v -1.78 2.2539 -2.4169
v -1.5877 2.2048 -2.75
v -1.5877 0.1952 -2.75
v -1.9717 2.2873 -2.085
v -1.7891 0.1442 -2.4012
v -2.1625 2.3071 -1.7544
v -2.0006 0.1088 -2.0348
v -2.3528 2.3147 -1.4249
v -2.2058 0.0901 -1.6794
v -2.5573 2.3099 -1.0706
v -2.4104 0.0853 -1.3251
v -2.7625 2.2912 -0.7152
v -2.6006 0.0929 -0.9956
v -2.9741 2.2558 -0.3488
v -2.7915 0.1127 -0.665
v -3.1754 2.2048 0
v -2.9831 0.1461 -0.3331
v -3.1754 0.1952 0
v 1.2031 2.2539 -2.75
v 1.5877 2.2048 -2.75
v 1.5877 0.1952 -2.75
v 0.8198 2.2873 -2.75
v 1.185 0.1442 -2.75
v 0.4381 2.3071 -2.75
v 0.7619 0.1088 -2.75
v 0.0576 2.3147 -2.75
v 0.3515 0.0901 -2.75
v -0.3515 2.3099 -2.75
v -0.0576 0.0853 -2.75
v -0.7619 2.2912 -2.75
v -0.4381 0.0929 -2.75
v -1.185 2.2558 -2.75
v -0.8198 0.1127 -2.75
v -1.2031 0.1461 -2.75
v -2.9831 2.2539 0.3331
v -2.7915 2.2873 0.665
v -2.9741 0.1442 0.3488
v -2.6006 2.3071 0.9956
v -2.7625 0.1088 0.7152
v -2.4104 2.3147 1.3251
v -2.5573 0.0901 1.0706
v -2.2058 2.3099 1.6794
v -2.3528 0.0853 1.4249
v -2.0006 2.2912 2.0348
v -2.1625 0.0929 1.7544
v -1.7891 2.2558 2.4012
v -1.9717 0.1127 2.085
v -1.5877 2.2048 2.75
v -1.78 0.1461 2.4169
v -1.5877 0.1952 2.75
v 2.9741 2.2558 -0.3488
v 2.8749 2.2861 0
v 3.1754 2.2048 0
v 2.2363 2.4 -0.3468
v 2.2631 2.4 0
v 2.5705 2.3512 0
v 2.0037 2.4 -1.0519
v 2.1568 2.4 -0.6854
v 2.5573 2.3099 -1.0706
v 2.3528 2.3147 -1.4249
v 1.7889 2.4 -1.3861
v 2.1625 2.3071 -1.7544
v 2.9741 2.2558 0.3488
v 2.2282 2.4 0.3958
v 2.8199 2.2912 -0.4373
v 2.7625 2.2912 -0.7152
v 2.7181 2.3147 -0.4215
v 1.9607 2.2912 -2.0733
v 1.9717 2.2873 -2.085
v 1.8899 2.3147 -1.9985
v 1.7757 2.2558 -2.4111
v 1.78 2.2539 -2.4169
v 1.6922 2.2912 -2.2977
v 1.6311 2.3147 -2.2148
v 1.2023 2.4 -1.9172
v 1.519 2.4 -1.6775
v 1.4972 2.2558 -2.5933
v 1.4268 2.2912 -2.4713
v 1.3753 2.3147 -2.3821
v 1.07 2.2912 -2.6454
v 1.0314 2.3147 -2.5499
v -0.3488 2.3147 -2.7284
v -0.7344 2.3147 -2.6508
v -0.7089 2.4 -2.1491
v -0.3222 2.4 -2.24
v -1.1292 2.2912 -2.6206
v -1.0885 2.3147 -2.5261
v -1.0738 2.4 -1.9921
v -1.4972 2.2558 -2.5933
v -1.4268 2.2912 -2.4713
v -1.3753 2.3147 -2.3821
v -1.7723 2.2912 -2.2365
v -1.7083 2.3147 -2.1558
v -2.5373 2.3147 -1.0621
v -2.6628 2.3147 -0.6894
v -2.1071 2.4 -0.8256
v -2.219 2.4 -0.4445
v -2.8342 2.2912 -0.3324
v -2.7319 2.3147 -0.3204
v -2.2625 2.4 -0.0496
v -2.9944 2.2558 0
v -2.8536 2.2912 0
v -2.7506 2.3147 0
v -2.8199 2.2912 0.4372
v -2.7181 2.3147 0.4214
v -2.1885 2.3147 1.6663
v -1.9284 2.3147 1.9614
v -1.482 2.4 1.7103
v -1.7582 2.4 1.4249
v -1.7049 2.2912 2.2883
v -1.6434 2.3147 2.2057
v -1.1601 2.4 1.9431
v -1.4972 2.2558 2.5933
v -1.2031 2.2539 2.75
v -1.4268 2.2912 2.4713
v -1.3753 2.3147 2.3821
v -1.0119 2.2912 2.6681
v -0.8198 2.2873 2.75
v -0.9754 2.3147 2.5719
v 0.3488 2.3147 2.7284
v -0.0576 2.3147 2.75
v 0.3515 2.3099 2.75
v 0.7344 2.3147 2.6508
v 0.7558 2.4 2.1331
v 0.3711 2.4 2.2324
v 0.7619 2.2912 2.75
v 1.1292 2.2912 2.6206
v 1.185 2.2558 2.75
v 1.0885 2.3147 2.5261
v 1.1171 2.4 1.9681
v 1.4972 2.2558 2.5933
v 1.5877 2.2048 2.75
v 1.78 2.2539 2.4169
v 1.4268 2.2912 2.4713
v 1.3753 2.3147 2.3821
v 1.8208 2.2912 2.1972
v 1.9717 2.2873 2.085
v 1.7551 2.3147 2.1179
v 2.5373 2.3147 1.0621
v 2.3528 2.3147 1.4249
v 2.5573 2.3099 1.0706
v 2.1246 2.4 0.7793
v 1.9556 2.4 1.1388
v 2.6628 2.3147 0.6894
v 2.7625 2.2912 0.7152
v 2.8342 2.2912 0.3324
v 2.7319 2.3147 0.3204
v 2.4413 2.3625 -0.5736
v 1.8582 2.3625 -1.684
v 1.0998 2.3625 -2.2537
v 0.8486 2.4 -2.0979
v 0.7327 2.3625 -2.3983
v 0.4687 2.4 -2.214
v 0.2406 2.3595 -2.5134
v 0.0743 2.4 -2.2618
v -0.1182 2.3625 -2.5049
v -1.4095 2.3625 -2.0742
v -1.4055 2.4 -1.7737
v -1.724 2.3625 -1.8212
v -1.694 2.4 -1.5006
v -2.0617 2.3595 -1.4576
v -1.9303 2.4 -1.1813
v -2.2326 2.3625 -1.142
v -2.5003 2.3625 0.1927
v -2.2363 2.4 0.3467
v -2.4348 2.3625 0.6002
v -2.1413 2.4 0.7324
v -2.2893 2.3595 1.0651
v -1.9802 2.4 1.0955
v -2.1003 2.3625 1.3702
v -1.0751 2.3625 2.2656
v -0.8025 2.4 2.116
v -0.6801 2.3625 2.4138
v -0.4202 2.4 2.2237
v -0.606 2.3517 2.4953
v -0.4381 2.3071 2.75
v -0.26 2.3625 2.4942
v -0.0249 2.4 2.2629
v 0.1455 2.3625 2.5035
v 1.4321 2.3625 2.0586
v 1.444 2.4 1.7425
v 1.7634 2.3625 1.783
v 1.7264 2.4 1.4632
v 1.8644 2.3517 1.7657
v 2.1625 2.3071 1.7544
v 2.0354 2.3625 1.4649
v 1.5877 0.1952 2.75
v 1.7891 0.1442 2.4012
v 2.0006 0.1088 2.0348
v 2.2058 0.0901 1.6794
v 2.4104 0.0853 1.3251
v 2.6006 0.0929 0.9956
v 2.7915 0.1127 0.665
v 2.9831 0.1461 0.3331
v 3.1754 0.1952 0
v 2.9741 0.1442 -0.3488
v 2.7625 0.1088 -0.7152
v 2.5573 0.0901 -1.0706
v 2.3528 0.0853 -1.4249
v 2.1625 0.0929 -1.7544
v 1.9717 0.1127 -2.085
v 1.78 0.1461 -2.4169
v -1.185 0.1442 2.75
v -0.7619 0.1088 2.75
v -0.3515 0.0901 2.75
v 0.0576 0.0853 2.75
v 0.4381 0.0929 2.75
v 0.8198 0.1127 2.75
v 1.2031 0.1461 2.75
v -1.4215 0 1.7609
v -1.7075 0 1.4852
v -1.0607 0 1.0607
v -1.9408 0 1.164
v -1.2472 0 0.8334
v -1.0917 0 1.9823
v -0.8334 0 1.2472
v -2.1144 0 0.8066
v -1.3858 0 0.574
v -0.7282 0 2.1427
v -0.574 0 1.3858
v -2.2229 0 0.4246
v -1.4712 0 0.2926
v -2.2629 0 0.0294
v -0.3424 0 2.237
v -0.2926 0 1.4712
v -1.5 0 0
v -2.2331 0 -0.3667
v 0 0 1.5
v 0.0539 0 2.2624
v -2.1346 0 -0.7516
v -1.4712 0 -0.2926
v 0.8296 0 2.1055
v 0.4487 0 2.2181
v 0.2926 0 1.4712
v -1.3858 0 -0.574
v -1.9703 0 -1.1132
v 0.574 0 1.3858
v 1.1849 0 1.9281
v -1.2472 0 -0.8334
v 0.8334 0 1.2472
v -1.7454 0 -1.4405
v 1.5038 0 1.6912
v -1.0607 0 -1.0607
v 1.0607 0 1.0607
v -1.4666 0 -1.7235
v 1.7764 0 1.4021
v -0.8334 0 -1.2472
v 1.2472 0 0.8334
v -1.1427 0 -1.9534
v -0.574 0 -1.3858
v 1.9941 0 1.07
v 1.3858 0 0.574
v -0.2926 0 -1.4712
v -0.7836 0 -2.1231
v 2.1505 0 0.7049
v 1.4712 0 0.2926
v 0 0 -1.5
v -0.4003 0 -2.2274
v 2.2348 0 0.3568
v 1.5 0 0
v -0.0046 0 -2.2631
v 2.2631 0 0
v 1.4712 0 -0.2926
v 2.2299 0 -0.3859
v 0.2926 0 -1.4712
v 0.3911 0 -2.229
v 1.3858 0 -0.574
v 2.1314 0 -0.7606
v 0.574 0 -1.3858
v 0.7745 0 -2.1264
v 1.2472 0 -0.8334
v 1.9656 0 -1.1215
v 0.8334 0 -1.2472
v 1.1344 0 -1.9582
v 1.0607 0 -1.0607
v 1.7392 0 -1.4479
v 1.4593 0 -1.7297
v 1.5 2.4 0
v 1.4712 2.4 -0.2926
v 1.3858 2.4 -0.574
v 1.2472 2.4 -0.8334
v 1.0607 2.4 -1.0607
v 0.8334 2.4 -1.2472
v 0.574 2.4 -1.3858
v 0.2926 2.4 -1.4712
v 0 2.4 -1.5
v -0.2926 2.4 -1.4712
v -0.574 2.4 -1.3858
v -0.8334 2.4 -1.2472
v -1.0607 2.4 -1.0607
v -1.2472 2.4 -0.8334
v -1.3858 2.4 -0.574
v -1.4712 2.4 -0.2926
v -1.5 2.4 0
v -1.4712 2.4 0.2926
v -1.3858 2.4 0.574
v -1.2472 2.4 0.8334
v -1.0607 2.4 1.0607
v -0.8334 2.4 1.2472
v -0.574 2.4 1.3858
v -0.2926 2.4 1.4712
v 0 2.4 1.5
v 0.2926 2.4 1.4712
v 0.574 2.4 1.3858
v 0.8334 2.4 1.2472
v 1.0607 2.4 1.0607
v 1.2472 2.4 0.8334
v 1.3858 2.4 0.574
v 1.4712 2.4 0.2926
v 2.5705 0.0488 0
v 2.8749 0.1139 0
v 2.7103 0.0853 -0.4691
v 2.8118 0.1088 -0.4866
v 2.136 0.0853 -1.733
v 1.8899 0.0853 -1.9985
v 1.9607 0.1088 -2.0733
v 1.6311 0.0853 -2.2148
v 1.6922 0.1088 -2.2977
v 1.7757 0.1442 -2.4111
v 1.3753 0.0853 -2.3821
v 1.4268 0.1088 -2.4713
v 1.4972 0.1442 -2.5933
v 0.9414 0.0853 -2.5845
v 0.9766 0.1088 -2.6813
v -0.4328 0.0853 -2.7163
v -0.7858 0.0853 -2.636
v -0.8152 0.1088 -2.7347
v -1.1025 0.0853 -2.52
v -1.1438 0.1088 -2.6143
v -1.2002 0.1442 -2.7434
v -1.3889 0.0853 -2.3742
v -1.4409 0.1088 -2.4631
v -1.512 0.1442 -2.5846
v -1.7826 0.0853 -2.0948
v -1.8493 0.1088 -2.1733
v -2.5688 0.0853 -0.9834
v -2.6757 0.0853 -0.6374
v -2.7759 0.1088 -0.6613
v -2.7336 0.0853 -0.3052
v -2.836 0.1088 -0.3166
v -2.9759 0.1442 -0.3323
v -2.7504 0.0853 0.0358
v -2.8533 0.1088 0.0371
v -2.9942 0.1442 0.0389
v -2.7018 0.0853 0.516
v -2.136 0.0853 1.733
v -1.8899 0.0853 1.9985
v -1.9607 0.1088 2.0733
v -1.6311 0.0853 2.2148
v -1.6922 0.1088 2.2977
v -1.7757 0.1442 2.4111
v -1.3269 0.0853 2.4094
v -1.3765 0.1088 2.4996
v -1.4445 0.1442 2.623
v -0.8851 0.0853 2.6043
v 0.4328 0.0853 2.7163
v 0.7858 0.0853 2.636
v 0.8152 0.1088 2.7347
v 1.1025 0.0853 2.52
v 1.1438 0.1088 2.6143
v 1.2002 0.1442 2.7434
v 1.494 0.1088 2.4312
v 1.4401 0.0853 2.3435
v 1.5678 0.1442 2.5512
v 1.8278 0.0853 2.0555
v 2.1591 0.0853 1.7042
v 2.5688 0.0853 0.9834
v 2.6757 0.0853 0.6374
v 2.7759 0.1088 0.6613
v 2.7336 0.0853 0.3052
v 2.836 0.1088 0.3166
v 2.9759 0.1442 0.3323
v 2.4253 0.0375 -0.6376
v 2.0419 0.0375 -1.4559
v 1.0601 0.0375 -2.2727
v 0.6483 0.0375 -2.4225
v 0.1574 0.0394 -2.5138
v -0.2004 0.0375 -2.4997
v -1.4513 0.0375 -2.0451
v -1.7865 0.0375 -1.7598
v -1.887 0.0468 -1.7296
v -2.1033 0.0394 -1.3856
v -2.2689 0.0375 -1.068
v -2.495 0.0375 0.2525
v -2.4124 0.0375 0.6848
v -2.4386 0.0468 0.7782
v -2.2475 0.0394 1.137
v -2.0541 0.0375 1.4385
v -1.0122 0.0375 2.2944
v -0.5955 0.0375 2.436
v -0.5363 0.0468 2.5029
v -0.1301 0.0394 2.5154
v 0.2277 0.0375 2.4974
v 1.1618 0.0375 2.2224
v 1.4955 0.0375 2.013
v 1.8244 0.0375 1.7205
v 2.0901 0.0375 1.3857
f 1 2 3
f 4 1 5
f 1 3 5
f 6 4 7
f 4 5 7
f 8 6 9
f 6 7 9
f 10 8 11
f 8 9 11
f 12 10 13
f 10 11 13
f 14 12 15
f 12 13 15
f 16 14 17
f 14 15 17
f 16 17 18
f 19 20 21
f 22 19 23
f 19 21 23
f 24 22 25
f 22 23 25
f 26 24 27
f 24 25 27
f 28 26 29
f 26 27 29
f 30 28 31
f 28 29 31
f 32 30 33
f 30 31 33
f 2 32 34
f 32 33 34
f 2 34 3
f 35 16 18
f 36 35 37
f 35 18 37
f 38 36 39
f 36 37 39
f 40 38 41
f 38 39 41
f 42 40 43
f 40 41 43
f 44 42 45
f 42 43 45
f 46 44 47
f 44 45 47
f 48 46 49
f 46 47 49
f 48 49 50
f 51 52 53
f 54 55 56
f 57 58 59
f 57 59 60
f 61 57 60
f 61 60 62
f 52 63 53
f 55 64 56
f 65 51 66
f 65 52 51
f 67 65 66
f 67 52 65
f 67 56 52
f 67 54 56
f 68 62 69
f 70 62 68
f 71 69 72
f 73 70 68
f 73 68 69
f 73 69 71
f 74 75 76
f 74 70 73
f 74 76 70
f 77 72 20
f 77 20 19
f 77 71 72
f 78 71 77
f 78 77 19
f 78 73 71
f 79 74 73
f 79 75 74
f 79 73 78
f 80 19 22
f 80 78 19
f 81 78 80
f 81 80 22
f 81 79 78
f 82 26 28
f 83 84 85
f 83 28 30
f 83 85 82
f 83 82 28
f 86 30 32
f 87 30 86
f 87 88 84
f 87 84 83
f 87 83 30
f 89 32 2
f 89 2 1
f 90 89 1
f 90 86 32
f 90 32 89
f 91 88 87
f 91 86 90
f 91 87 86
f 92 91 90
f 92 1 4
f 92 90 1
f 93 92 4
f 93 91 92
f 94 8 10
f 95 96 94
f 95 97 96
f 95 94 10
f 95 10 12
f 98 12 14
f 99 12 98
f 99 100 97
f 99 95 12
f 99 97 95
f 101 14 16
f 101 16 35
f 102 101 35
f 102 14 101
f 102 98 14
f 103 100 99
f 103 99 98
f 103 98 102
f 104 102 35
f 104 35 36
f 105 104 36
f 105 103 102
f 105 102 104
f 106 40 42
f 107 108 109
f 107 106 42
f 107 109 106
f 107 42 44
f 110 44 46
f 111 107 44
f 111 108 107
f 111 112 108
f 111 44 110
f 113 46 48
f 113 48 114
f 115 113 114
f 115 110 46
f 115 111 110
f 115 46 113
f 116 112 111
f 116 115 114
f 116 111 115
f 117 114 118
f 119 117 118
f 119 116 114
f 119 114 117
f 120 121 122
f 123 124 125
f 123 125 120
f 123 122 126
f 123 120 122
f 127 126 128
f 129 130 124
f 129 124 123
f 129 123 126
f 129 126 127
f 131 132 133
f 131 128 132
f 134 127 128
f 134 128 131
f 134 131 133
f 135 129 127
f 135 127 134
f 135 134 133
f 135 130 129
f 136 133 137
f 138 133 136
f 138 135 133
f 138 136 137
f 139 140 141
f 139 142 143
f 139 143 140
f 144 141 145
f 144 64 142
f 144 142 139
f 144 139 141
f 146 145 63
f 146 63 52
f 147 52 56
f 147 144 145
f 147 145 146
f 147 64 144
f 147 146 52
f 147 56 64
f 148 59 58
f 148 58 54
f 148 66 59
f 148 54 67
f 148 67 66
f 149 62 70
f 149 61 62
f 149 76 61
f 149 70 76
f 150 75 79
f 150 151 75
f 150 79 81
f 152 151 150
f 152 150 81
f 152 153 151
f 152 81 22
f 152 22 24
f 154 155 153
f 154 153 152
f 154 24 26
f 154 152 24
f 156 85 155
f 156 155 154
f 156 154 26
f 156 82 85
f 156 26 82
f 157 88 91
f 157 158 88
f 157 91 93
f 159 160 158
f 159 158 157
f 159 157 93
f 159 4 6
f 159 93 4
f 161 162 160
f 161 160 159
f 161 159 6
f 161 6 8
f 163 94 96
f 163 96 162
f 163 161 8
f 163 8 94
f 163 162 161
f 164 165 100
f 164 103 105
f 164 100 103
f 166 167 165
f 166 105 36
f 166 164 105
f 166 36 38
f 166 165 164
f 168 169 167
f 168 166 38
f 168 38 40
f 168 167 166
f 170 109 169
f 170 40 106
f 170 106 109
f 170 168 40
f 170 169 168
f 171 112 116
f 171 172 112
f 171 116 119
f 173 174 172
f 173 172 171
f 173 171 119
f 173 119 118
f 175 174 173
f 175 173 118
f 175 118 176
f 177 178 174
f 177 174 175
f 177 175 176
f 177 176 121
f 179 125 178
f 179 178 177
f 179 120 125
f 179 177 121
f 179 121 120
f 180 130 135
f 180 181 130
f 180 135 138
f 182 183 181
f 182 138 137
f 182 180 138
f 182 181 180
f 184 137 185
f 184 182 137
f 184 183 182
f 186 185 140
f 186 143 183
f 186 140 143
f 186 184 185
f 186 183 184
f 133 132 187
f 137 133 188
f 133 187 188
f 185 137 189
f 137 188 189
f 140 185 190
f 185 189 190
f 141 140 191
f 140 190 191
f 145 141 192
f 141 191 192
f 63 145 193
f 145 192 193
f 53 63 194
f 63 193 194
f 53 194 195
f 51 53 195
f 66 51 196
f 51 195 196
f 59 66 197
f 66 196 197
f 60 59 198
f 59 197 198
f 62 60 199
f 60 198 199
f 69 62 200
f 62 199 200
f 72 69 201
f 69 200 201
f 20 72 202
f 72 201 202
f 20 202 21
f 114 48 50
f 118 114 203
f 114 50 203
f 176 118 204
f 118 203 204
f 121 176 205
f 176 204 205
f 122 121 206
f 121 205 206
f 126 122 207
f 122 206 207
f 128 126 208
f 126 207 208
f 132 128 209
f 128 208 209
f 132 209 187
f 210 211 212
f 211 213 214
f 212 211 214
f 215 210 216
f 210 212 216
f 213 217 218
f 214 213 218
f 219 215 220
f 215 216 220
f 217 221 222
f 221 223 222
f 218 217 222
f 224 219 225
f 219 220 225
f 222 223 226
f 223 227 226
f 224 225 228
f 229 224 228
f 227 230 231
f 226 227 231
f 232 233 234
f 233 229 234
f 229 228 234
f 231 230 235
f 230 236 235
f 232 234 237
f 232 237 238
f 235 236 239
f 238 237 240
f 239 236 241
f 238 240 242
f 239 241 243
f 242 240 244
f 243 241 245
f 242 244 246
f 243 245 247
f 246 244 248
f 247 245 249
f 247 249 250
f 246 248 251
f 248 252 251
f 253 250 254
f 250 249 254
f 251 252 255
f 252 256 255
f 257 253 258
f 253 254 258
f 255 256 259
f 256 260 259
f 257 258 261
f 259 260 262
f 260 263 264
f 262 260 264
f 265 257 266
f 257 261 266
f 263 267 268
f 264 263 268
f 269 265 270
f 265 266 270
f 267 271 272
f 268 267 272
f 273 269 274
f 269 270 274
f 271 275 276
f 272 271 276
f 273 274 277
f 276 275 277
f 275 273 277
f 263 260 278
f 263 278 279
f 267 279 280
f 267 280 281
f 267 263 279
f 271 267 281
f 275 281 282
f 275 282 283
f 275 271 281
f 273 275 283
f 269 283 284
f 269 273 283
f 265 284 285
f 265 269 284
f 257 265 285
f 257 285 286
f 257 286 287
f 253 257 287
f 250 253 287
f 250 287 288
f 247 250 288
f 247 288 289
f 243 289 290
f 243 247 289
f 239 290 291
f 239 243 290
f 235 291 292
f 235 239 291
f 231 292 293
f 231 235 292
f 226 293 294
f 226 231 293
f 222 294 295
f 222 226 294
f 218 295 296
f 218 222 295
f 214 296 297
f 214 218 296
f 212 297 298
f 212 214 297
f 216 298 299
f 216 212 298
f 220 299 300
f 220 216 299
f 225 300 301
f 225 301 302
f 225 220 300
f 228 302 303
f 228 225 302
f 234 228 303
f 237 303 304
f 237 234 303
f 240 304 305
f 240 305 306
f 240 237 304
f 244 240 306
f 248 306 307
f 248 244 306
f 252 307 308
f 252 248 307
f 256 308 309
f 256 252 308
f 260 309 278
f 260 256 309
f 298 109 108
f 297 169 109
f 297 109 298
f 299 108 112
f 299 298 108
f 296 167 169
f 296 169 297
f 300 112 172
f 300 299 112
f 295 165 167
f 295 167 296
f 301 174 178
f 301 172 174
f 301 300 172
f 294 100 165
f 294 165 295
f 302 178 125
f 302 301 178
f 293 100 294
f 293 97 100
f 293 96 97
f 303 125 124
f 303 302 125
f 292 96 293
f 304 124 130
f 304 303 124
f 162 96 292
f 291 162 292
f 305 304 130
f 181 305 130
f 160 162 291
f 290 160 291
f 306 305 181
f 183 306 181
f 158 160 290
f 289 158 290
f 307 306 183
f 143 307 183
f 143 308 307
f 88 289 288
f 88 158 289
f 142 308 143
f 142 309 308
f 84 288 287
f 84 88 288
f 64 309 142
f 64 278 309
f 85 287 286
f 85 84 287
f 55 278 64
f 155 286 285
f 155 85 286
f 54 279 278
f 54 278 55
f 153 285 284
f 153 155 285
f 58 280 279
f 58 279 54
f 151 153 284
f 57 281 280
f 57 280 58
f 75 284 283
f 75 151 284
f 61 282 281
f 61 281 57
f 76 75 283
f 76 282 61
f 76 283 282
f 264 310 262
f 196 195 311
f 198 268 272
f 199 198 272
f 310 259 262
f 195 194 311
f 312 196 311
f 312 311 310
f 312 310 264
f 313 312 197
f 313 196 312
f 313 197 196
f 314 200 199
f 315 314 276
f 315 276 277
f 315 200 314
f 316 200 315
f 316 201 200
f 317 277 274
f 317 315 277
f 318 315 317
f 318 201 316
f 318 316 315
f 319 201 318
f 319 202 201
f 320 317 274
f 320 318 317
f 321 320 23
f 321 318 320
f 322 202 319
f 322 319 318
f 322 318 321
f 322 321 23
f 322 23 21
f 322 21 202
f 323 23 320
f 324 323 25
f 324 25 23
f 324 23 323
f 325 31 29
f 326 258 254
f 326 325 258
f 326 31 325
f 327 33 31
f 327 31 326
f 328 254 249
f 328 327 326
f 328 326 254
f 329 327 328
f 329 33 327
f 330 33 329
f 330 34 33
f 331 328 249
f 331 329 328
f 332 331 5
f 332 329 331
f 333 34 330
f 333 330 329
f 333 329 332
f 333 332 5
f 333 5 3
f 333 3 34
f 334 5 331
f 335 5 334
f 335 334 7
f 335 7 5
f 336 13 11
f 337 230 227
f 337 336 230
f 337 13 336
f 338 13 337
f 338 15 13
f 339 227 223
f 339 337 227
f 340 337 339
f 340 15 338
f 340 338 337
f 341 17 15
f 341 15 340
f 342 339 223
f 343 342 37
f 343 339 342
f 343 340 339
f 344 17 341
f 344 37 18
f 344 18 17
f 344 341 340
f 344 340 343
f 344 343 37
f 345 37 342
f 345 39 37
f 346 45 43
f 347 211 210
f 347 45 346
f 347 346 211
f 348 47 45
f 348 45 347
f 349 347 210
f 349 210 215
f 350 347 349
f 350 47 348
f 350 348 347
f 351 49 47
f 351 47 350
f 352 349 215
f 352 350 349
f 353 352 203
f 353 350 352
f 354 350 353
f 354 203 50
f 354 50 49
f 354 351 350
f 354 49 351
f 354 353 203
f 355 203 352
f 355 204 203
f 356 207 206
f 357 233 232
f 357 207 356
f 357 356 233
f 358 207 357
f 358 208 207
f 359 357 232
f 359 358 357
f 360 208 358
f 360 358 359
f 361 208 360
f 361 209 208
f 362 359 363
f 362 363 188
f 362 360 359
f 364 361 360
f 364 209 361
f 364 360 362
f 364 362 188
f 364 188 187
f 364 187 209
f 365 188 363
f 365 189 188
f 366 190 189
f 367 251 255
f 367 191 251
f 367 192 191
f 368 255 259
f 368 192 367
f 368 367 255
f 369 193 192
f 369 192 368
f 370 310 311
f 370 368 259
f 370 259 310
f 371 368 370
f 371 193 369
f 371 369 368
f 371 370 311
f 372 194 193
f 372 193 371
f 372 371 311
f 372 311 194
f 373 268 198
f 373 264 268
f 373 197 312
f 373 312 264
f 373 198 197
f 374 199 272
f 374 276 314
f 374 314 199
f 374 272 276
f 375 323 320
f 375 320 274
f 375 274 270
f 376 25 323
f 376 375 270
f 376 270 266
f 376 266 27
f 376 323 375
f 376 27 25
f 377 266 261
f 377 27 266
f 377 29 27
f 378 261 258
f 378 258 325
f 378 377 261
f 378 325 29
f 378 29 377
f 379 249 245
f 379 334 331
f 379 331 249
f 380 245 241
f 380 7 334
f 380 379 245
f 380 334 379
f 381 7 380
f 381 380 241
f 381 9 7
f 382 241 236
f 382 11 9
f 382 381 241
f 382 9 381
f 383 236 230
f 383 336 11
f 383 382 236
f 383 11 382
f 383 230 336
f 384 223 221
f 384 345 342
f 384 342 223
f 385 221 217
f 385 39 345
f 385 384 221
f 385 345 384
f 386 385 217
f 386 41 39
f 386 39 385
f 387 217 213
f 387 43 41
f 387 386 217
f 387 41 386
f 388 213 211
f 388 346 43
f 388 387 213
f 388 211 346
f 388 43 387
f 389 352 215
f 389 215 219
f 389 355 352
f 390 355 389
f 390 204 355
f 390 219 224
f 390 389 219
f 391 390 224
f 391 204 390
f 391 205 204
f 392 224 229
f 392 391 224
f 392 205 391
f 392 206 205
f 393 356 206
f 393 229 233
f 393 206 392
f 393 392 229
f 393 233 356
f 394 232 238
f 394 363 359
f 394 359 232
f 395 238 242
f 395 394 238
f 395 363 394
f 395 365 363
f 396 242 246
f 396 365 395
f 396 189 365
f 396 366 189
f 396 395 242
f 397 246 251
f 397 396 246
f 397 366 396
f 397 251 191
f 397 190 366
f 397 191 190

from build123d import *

# Parameters (mm, degrees)
ESBO_O1_R                = 1.5
RESSALTO_EXTRUS_O1_DEPTH = 2.4


with BuildPart() as part:
    # Esboço1 → Ressalto-extrusão1 (new body)
    with BuildSketch(Plane(origin=(0, 0, 0), x_dir=(1, 0, 0), z_dir=(0, 1, 0))):
        Polygon((3.175426481, 0), (1.58771324, 2.75), (-1.58771324, 2.75), (-3.175426481, 0), (-1.58771324, -2.75), (1.58771324, -2.75), align=None)
        Circle(ESBO_O1_R, mode=Mode.SUBTRACT)
    extrude(amount=RESSALTO_EXTRUS_O1_DEPTH)

    # Esboço3 → Corte-Revolução1 (revolve, cut)
    with BuildSketch(Plane.XY):
        with BuildLine():
            Line((1.5, 2.45), (1.5, 3.039454742))
            Line((1.5, 3.039454742), (3.5, 3.039454742))
            Line((3.5, 3.039454742), (3.5, 2.097346039))
            ThreePointArc((3.5, 2.097346039), (2.515426612, 2.361161683), (1.5, 2.45))
        make_face()
        with BuildLine():
            ThreePointArc((1.5, -0.05), (2.515426612, 0.038838317), (3.5, 0.302653961))
            Line((3.5, 0.302653961), (3.5, -0.837086604))
            Line((3.5, -0.837086604), (1.5, -0.837086604))
            Line((1.5, -0.837086604), (1.5, -0.05))
        make_face()
    revolve(axis=Axis((0, 0, 0), (0, 1, 0)), mode=Mode.SUBTRACT)


solid = part.part
